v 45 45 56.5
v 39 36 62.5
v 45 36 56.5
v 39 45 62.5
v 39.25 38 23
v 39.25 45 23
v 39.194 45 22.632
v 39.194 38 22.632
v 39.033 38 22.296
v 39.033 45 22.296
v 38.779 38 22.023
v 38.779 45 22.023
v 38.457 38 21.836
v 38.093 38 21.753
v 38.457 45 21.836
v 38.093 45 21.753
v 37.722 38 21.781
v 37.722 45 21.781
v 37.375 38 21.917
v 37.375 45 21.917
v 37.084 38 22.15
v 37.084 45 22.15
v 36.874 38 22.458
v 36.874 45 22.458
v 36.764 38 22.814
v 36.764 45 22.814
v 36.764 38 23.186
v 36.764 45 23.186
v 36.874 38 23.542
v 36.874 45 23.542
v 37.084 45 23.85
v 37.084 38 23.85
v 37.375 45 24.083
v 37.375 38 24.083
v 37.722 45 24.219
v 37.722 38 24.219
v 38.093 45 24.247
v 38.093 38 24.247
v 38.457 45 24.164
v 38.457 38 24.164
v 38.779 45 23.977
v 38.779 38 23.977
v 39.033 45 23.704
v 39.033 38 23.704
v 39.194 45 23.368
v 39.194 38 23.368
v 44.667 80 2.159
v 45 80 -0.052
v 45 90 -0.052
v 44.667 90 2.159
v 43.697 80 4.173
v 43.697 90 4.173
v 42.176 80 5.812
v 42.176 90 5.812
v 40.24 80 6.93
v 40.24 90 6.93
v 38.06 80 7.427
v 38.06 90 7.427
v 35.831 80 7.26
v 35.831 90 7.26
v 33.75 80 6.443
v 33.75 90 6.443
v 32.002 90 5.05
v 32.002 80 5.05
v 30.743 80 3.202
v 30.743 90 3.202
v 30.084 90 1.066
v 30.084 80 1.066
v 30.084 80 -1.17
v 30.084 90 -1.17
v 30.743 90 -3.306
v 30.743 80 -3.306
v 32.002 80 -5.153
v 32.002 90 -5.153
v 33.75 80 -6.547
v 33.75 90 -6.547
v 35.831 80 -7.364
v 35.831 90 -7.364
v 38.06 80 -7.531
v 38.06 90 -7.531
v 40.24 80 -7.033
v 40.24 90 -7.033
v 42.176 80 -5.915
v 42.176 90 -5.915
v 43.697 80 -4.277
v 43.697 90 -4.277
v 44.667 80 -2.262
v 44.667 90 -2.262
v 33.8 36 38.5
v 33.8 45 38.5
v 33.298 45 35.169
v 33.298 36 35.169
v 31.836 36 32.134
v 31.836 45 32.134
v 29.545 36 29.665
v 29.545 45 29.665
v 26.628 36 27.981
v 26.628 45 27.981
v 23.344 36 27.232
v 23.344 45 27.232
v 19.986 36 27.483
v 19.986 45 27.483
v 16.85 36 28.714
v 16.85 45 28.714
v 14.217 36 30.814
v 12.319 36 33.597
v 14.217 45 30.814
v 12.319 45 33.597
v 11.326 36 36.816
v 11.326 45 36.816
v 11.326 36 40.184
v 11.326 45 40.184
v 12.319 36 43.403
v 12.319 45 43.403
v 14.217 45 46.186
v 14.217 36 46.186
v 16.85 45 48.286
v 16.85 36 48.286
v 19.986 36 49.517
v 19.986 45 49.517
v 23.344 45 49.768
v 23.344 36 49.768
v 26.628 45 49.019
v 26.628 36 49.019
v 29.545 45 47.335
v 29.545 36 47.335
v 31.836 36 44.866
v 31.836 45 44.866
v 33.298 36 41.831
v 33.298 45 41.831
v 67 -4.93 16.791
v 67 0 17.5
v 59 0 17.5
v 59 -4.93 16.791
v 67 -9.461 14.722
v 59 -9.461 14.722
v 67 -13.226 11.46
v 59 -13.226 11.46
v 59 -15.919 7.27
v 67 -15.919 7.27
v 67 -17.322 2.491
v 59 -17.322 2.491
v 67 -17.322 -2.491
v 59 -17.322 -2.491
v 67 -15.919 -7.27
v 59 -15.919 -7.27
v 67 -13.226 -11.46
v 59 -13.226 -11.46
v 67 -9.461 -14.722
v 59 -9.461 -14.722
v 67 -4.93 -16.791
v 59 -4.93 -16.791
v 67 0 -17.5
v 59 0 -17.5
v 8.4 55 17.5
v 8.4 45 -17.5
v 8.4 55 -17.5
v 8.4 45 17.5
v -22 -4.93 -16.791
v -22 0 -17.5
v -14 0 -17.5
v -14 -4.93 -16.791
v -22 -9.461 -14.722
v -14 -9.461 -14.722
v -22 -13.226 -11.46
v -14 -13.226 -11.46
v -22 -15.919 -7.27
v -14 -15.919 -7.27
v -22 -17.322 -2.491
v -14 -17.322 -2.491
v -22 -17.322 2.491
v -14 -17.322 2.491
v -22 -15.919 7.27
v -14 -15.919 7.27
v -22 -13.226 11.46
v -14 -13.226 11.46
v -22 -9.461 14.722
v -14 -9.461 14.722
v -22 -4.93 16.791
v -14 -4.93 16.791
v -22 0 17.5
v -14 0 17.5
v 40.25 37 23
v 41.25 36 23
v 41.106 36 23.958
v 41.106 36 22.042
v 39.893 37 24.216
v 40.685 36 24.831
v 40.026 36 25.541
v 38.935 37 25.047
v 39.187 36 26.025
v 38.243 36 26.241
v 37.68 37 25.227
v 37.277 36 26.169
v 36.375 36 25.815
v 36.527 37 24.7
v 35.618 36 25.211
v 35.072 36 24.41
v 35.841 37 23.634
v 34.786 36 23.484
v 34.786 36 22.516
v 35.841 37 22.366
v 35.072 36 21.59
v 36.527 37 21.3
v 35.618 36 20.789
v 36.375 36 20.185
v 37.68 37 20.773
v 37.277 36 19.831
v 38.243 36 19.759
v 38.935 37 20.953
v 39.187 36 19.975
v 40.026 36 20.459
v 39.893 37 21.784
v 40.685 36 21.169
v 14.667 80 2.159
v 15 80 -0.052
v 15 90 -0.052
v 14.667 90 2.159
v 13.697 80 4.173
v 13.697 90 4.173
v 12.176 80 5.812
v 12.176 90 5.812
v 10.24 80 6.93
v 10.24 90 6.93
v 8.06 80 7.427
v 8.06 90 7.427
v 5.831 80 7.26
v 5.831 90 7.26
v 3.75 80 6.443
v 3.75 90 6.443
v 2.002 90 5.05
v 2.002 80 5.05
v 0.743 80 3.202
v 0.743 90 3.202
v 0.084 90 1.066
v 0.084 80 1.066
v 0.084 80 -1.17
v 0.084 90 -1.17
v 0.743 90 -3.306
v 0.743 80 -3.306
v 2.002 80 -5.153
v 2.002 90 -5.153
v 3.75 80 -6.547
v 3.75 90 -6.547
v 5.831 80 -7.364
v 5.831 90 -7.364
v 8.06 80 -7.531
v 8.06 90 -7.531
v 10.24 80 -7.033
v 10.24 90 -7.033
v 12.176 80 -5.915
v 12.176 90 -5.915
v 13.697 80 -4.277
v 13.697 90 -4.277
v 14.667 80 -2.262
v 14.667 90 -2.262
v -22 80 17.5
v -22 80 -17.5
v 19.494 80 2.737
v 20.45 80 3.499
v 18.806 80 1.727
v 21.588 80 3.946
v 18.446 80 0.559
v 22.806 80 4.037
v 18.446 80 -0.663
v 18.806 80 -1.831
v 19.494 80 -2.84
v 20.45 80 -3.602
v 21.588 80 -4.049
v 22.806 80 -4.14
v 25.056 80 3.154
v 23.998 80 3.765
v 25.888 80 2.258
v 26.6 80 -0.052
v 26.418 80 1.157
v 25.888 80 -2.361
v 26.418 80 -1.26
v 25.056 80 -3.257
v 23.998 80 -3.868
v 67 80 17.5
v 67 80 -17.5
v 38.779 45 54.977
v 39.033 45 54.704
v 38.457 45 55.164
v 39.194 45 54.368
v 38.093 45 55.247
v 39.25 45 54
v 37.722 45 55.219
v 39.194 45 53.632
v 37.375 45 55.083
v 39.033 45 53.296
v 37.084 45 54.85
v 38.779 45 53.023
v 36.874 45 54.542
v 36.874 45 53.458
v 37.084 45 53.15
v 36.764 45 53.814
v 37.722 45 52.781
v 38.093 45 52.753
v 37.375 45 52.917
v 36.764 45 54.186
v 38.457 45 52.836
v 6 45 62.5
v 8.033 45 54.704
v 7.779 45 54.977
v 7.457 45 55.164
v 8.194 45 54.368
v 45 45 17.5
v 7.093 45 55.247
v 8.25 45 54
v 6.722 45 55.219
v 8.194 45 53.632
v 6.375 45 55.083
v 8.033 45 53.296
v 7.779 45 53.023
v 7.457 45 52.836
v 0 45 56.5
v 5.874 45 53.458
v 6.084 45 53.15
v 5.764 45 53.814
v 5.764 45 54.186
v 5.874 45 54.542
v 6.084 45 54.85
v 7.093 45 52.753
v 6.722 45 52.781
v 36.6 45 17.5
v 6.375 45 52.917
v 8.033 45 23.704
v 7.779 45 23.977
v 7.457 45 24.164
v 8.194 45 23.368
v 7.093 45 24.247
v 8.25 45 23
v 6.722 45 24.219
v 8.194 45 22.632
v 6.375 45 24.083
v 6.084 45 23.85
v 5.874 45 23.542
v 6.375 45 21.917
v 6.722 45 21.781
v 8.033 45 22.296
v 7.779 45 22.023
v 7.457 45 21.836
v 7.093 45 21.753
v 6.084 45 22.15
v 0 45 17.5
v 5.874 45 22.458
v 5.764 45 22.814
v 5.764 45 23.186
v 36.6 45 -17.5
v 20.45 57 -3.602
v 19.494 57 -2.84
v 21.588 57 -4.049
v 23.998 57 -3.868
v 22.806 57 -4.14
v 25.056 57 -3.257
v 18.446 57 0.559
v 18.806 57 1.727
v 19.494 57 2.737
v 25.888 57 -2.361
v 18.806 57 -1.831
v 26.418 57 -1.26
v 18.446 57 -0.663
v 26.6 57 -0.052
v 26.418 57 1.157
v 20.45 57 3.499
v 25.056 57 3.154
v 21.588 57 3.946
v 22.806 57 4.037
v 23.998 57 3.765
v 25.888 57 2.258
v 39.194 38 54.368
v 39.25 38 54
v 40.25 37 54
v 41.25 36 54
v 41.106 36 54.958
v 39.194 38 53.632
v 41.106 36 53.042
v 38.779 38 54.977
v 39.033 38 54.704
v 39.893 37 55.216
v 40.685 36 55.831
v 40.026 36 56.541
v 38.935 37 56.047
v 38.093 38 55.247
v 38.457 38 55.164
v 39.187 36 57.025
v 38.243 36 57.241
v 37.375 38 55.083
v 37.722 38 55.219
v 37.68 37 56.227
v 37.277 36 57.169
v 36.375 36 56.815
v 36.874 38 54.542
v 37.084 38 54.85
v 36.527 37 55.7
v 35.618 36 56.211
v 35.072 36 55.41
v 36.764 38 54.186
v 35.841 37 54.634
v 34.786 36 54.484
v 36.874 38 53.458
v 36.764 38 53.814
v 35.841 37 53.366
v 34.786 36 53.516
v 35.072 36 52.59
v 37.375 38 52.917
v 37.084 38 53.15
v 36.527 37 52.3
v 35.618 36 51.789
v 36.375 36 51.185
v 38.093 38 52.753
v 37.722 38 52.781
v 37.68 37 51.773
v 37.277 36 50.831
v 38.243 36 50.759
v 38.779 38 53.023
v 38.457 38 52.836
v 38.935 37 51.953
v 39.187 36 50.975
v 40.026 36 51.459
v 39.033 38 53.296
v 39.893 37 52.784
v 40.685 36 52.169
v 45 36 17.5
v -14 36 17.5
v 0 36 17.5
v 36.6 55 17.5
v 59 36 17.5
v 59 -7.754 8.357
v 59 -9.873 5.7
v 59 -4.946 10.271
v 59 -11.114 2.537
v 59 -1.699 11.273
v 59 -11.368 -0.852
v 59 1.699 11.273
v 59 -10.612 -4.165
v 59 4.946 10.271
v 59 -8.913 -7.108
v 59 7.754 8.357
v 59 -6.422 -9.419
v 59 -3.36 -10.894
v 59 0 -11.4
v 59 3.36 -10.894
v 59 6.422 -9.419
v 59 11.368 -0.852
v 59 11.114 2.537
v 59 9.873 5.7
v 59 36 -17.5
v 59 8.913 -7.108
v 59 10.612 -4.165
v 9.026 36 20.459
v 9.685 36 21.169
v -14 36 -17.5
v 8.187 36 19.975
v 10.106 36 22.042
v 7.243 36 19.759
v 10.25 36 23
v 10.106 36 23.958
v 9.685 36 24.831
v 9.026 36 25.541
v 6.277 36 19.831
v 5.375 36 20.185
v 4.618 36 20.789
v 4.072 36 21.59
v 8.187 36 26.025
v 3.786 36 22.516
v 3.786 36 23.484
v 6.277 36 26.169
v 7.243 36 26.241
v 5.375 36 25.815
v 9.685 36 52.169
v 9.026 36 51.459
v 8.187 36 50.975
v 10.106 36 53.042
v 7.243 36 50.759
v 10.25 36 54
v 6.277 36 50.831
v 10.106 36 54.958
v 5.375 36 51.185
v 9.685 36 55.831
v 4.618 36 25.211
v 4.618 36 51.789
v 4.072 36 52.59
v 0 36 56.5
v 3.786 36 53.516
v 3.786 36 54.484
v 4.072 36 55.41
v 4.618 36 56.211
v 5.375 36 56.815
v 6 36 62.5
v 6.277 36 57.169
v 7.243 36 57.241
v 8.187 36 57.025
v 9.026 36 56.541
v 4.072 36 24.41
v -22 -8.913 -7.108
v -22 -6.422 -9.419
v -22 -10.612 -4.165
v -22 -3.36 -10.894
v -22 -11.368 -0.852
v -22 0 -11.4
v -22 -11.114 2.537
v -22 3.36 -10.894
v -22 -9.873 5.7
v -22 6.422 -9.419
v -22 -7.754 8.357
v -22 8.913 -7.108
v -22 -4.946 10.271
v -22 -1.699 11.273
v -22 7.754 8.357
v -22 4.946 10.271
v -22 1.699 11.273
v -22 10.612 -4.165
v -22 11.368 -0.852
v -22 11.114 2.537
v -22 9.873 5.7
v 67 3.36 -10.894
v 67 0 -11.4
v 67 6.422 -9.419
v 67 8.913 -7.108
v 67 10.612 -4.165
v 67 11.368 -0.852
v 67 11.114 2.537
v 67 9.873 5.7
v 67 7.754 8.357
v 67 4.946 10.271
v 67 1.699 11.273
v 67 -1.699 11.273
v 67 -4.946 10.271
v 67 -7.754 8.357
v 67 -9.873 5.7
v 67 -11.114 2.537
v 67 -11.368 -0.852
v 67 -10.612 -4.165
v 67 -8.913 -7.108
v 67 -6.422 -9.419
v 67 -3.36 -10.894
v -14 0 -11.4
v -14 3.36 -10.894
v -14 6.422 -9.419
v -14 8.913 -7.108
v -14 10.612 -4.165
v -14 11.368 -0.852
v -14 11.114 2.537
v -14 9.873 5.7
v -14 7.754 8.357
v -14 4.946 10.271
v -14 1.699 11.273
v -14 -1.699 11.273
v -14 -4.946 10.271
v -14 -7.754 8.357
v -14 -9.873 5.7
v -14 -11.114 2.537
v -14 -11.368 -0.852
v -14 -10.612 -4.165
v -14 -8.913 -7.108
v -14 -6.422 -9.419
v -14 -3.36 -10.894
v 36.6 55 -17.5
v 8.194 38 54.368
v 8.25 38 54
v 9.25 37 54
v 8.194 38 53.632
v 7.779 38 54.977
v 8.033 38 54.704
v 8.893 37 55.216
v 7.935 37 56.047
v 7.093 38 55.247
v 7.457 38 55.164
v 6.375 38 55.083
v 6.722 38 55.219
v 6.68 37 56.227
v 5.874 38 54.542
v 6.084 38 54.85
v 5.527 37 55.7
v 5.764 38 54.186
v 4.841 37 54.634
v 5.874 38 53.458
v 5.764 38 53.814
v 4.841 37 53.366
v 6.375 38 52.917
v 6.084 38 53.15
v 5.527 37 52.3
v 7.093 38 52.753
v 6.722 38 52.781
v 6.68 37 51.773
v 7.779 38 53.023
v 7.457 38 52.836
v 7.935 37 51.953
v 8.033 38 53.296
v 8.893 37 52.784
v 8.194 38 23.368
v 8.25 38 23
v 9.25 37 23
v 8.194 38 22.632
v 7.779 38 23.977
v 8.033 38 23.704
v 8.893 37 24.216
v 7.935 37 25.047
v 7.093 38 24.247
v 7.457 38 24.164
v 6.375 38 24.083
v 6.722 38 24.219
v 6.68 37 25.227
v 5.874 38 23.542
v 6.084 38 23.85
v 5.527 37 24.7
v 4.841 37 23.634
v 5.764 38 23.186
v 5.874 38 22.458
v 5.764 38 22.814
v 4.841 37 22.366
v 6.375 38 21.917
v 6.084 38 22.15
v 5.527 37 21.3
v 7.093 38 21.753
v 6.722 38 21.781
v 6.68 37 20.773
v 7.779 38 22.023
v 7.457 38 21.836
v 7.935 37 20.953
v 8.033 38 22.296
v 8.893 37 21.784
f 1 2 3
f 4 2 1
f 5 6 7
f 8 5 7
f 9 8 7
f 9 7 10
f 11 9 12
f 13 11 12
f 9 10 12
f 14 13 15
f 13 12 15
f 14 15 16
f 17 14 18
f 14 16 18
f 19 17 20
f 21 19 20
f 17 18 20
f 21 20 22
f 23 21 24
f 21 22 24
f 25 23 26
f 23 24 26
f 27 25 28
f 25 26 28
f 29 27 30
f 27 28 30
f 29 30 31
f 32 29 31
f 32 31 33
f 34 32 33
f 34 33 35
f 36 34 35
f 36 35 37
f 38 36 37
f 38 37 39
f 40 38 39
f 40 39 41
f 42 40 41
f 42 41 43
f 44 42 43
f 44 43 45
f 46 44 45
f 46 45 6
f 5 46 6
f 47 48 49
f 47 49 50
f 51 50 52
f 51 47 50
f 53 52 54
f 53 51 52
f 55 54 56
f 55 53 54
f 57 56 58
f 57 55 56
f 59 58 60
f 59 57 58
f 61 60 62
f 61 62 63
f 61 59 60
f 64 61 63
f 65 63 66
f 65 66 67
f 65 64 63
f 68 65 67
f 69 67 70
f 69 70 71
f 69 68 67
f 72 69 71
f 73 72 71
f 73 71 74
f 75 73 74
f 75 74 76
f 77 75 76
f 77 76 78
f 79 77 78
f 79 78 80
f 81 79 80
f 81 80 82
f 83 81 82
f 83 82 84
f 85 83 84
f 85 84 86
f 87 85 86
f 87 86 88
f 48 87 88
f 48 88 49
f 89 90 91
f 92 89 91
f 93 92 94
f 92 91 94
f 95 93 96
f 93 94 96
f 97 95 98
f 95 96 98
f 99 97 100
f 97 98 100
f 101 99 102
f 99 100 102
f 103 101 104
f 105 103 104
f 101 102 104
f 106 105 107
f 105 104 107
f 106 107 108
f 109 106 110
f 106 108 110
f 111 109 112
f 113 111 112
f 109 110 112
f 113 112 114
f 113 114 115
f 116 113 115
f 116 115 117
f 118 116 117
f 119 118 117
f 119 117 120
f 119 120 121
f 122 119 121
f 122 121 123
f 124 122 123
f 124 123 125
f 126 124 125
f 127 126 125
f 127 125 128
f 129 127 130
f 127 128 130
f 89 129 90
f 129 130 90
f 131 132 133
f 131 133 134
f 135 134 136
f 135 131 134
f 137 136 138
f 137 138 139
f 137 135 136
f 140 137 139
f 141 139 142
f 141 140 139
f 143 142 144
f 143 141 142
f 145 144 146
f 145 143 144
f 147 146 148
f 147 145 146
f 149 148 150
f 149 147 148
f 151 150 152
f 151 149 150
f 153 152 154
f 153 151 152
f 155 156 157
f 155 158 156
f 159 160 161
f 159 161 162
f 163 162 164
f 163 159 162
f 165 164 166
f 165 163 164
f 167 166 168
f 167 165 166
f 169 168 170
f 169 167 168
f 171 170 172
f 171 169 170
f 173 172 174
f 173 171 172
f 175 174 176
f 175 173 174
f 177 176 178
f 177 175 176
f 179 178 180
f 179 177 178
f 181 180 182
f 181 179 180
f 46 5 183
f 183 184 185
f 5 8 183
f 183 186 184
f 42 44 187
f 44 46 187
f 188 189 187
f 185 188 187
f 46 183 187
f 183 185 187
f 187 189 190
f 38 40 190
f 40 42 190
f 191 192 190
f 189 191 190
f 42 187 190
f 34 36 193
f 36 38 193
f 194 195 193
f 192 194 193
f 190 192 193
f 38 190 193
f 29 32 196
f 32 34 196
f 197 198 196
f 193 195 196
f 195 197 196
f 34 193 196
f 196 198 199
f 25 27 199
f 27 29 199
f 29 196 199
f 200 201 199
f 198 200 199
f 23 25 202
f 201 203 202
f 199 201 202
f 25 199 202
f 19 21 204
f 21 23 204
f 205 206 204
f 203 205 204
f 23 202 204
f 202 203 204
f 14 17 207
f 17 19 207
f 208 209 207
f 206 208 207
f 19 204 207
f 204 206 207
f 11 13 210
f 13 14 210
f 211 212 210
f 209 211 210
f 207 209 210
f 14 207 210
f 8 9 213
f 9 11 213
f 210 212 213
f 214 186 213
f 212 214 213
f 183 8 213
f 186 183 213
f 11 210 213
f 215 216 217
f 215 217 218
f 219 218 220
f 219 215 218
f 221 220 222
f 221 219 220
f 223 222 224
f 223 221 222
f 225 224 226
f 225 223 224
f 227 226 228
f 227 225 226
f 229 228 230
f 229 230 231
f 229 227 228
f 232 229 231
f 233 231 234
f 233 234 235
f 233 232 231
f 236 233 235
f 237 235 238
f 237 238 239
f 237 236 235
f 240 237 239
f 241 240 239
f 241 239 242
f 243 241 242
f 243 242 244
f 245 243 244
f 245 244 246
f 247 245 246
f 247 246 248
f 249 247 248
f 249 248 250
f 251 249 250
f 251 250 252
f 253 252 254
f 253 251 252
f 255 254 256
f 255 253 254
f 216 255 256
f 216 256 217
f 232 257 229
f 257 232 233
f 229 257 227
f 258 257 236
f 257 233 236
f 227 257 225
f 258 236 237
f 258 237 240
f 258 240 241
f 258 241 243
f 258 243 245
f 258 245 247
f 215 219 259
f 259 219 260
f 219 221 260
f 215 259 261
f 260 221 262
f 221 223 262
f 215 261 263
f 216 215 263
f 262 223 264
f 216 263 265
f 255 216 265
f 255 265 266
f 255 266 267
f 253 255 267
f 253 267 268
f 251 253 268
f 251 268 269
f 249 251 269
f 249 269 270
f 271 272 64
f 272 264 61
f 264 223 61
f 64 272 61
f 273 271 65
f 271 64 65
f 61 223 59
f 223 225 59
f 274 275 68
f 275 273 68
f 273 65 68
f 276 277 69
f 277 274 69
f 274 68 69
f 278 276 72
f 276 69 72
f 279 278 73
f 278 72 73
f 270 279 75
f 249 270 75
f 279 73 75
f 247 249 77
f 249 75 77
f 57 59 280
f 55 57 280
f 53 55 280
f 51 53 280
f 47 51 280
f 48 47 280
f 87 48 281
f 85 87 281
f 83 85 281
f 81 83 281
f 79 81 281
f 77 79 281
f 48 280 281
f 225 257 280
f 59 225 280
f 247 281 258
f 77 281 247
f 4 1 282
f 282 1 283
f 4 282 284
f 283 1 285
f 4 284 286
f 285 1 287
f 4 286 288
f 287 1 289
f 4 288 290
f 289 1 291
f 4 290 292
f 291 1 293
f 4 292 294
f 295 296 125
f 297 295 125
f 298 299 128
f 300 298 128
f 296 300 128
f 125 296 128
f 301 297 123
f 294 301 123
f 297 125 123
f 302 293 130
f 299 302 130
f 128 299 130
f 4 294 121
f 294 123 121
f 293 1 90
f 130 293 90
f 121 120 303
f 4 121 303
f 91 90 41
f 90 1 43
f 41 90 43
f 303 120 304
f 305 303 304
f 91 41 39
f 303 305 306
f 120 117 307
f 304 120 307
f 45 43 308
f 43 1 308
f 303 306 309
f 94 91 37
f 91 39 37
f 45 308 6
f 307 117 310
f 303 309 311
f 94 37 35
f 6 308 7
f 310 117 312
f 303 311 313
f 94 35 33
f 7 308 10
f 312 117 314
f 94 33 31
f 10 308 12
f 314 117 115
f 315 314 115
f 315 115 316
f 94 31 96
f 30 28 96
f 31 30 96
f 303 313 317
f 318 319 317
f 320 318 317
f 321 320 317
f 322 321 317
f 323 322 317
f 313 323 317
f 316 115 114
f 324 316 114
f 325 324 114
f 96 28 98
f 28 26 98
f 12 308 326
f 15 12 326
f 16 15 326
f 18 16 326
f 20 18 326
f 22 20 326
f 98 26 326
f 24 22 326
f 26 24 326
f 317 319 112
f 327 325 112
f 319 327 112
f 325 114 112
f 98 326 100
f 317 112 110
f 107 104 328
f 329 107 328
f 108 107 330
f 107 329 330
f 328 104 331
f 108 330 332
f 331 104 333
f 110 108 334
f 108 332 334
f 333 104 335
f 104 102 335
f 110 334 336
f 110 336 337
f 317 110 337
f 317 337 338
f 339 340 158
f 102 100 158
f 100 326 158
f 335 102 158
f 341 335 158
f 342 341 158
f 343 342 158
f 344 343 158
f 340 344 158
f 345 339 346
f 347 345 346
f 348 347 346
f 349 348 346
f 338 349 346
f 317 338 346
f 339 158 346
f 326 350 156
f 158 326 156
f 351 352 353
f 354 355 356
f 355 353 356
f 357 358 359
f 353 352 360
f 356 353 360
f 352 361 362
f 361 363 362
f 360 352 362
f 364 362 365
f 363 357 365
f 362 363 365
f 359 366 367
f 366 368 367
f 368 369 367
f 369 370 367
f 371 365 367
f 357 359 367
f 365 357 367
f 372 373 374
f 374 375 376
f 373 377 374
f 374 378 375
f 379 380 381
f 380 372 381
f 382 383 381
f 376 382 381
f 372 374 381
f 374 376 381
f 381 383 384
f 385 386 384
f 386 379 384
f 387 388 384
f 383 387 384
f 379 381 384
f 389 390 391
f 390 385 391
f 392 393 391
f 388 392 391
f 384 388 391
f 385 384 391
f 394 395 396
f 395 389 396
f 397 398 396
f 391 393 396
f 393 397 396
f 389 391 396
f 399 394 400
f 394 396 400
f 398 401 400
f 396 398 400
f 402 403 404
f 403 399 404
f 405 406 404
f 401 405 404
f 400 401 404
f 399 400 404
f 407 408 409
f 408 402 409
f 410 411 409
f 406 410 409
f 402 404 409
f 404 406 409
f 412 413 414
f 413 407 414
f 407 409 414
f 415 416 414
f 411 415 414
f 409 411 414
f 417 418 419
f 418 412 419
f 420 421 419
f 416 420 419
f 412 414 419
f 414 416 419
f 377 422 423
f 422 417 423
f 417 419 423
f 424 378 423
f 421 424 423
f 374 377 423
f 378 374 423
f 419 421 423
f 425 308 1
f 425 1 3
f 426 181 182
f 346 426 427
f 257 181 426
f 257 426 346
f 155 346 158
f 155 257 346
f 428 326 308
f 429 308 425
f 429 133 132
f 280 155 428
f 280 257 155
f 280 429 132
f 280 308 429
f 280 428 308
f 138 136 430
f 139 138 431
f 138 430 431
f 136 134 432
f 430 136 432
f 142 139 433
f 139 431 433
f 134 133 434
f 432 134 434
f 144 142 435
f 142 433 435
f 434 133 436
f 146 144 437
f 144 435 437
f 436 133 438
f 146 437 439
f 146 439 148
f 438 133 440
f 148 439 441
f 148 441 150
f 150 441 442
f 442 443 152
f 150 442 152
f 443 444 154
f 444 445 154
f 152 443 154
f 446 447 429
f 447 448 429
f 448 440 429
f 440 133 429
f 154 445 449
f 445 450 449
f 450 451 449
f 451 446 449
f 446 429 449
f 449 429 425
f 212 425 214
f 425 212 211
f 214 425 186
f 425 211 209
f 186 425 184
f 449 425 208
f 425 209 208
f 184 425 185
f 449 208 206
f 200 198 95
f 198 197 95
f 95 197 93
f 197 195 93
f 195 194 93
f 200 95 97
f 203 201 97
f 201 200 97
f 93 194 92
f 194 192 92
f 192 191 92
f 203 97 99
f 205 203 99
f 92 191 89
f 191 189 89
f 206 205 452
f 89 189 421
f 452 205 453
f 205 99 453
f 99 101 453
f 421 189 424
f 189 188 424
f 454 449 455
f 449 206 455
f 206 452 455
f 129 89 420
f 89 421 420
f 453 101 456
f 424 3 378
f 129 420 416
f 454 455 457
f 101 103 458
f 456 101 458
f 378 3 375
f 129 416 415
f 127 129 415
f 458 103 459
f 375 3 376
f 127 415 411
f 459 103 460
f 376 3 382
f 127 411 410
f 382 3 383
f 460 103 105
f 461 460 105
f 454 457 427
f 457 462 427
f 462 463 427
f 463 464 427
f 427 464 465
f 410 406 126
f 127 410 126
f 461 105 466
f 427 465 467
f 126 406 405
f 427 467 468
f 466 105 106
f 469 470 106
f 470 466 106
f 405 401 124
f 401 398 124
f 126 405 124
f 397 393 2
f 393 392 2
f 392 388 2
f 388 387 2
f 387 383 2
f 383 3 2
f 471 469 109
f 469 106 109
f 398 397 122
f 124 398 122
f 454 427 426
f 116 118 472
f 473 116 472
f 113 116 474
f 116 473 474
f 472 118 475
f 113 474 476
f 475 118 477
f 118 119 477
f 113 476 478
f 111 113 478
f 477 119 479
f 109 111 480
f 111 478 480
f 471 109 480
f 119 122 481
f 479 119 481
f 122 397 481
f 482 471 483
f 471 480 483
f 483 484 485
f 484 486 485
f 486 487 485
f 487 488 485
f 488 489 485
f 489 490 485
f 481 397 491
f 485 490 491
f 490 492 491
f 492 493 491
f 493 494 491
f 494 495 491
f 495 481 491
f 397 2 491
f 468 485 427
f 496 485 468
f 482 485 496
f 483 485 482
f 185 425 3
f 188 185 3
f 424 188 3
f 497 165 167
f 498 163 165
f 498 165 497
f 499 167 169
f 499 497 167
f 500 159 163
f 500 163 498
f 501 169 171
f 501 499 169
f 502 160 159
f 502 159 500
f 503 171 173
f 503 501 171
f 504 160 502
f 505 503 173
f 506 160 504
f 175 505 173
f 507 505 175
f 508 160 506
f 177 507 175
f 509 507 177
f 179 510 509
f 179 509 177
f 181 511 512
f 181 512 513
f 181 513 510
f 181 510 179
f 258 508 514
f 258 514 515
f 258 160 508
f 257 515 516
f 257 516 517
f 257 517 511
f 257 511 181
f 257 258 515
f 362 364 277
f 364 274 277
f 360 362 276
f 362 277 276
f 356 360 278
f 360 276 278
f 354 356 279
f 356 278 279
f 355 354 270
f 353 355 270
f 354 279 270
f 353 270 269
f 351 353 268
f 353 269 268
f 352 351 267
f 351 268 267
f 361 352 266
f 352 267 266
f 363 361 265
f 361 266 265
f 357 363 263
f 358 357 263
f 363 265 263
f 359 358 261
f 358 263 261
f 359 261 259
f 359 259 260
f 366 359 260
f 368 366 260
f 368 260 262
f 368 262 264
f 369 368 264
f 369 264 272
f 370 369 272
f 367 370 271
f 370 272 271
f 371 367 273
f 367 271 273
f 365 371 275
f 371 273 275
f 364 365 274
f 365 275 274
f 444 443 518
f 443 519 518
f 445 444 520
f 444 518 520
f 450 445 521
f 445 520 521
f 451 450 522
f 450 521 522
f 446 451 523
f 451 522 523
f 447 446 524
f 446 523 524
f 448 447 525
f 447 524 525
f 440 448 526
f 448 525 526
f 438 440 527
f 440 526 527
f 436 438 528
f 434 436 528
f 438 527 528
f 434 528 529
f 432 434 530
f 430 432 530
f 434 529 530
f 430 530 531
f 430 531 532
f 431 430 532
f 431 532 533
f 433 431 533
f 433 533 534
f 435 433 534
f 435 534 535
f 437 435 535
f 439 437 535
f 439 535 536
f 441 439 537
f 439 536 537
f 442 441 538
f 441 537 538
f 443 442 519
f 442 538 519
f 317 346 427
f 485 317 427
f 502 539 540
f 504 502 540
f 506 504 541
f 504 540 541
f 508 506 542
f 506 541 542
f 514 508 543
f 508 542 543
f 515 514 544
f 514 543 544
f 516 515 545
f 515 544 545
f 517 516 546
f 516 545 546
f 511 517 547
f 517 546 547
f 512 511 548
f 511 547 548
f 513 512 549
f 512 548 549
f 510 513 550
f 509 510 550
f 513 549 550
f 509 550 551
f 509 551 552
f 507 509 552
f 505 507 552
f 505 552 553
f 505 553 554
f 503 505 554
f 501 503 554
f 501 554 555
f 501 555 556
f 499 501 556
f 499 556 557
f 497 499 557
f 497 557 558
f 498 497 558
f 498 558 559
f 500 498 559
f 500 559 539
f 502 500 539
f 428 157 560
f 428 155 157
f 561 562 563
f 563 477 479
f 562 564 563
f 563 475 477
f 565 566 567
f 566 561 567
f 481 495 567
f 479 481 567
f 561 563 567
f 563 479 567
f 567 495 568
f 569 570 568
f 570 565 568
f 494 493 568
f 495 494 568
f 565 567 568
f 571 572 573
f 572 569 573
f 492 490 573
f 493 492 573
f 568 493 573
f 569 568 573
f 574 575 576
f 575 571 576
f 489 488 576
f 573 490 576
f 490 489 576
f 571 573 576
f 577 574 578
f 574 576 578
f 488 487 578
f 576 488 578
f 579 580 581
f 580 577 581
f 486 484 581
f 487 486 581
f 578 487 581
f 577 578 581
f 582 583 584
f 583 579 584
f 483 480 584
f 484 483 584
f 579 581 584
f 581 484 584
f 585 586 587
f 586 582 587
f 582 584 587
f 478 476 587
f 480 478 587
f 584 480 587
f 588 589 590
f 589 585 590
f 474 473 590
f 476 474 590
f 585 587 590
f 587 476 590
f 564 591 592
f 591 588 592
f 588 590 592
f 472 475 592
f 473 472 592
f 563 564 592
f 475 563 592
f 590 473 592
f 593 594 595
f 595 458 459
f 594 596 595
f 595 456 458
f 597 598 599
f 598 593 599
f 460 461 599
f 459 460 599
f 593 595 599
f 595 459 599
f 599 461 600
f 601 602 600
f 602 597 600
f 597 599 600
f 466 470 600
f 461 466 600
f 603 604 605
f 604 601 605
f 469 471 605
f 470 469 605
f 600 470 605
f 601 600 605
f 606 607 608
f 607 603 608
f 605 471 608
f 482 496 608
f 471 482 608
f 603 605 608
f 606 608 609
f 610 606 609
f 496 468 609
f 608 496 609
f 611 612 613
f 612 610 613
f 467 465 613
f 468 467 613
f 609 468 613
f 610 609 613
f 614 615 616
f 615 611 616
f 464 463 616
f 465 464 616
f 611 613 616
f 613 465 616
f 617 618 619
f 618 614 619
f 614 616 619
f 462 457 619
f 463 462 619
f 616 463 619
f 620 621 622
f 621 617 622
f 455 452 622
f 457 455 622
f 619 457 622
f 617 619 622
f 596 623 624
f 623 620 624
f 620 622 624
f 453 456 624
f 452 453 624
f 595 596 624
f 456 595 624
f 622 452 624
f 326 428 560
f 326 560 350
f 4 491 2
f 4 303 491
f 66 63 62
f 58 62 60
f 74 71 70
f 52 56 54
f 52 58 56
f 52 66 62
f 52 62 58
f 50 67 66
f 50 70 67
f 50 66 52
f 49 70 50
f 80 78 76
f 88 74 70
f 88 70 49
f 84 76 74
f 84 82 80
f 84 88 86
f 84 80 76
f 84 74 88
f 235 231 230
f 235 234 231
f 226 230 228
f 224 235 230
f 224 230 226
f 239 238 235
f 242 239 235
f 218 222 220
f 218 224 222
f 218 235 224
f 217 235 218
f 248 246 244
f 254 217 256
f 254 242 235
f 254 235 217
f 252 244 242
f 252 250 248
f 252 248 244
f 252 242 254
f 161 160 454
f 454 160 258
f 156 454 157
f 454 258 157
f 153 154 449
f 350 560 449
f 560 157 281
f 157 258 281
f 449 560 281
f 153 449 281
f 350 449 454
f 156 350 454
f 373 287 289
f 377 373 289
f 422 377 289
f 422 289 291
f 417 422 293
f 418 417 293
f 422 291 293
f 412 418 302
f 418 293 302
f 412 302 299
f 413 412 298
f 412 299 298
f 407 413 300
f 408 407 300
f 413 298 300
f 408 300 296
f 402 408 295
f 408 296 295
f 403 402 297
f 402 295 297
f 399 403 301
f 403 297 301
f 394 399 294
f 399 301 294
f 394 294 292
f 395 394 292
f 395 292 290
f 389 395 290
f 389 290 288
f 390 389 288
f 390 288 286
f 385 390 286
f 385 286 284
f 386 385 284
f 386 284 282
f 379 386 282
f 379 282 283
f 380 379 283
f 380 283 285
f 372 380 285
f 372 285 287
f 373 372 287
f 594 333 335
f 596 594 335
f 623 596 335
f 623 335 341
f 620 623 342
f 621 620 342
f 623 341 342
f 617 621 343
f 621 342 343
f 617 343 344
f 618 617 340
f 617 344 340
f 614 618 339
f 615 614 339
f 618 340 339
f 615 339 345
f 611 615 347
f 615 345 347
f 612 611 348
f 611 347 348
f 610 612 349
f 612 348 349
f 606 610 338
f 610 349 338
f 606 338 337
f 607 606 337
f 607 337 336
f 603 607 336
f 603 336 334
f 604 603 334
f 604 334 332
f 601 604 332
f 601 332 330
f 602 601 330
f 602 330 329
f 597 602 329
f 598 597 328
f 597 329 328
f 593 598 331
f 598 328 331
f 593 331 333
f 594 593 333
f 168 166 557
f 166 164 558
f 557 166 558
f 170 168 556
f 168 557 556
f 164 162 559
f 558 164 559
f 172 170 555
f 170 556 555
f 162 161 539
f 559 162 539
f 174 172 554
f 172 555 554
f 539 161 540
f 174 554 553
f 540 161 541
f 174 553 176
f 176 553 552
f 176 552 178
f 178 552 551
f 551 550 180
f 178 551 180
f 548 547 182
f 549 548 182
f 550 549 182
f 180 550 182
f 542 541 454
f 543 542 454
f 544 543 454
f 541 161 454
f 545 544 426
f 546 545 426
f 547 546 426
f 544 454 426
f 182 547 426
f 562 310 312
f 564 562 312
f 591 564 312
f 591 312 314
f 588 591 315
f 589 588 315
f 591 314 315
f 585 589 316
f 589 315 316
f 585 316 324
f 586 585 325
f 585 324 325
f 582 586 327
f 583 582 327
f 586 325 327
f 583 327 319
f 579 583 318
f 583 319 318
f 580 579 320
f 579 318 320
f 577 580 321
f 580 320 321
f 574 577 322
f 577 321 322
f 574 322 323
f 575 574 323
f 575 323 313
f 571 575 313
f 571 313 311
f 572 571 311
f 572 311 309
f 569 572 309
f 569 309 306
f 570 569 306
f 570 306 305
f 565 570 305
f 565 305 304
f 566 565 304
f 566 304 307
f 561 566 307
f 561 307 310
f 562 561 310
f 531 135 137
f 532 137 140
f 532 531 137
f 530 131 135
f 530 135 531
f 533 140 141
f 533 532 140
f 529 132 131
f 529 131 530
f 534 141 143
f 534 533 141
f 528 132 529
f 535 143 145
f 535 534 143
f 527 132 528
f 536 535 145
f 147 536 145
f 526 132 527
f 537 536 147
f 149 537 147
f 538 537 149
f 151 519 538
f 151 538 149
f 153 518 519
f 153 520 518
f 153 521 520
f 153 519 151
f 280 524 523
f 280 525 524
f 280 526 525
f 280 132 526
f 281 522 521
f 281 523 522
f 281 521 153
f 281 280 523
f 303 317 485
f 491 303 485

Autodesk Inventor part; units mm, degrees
ref_plane "YZ Plane" through (0, 0, 0) normal (1, 0, 0) x (0, 1, 0)
ref_plane "XZ Plane" through (0, 0, 0) normal (0, 1, 0) x (-1, 0, 0)
sketch "Эскиз1" plane through (0, 0, 0) normal (1, 0, 0) x (0, 1, 0)
  line L0 (-6, -6.0208) -> (-6, 6.0208)
  arc A0 (-6, -6.0208) -> (6, -6.0208) centre (0, 0) ccw
  line L1 (6, 6.0208) -> (6, -6.0208)
  arc A1 (6, 6.0208) -> (-6, 6.0208) centre (0, 0) ccw
  circle A2 centre (0, 0) radius 17.5
  line L2 (0, 17.5) -> (80, 17.5)
  line L3 (80, 17.5) -> (80, -17.5)
  line L4 (80, -17.5) -> (0, -17.5)
  line L5 (0, -17.5) -> (0, -8.5)
  line L6 (0, 8.5) -> (0, 17.5)
  dimension "d0" = 35
  dimension "d1" = 80
extrude "Выдавливание1" add sketch "Эскиз1" along normal blind 45 contours A0 L5 A2 L6 A1 L0 | A0 L1 A1 L6 A2 L5 | A2 L2 L3 L4
sketch "Эскиз2" plane through (45, 0, 0) normal (1, 0, 0) x (0, 0, -1)
  line L0 (17.5, 80) -> (-17.5, 80) projected
  line L1 (17.5, 0) -> (17.5, 80) projected
  line L2 (-17.5, 80) -> (17.5, 80)
  line L3 (17.5, 80) -> (17.5, 57)
  line L4 (17.5, 57) -> (-17.5, 57)
  line L5 (-17.5, 57) -> (-17.5, 80)
  point P0 (0, 0)
  dimension "d4" = 23
extrude "Выдавливание2" add sketch "Эскиз2" along normal blind 22
ref_plane "РабПлоскость1" through (22.5, 0, 17.5) normal (1, 0, 0) x (0, 0, -1)
mirror "Зеркальное отражение1" about plane through (22.5, 0, 17.5) normal (1, 0, 0) of "Выдавливание2"
sketch "Эскиз3" plane through (45, 0, 0) normal (1, 0, 0) x (0, 0, -1)
  arc A0 (6.0208, -6) -> (6.0208, 6) centre (0, 0) ccw projected
  line L0 (6.0208, -6) -> (-6.0208, -6) projected
  arc A1 (-6.0208, 6) -> (-6.0208, -6) centre (0, 0) ccw projected
  line L1 (6.0208, 6) -> (-6.0208, 6) projected
  line L2 (17.5, 57) -> (-17.5, 57) projected
  line L3 (-17.5, 57) -> (-17.5, 0) projected
  arc A2 (-17.5, 0) -> (17.5, 0) centre (0, 0) ccw projected
  line L4 (17.5, 0) -> (17.5, 57) projected
sketch "Эскиз4" plane through (67, 0, 0) normal (1, 0, 0) x (0, 0, -1)
  arc A0 (6.0208, -6) -> (6.0208, 6) centre (0, 0) ccw
  line L0 (6.0208, -6) -> (-6.0208, -6)
  arc A1 (-6.0208, 6) -> (-6.0208, -6) centre (0, 0) ccw
  line L1 (6.0208, 6) -> (-6.0208, 6)
  line L2 (17.5, 37) -> (-17.5, 37)
  line L3 (-17.5, 37) -> (-17.5, 0)
  arc A2 (-17.5, 0) -> (17.5, 0) centre (0, 0) ccw
  line L4 (17.5, 0) -> (17.5, 37)
  line L5 (17.5, 0) -> (17.5, 57) projected
  line L6 (-17.5, 37) -> (17.5, 37)
  line L7 (17.5, 37) -> (17.5, 57)
  line L8 (17.5, 57) -> (-17.5, 57)
  line L9 (-17.5, 57) -> (-17.5, 37)
extrude "Выдавливание3" add sketch "Эскиз4" against normal blind 8
mirror "Зеркальное отражение2" about plane through (22.5, 0, 17.5) normal (1, 0, 0) of "Выдавливание3"
sketch "Эскиз5" plane through (67, 80, 17.5) normal (0, 1, 0) x (1, 0, 0)
  line L0 (-89, 35) -> (-89, 0) projected
  line L1 (-89, 35.1034) -> (-89, 0)
  line L2 (-89, 0) -> (-89, 35.1034)
  line L3 (-89, 35) -> (0, 35) projected
  line L4 (-89, 35) -> (0, 35)
  line L5 (-89, 17.5517) -> (-44.5, 17.5517)
  circle A0 centre (-44.5, 17.5517) radius 4.1
  line L6 (-44.5, 17.5517) -> (-59.5, 17.5517)
  circle A1 centre (-59.5, 17.5517) radius 7.5
  line L7 (-44.5, 17.5517) -> (-29.5, 17.5517)
  circle A2 centre (-29.5, 17.5517) radius 7.5
  point P0 (-67, 17.5)
  dimension "d9" = 8.2
  dimension "d10" = 15
  dimension "d11" = 15
  dimension "d12" = 15
  dimension "d13" = 15
extrude "Выдавливание4" add sketch "Эскиз5" along normal blind 10 contours L5 A1 | L5 A1 | A2
sketch "Эскиз6" plane through (67, 80, 17.5) normal (0, 1, 0) x (1, 0, 0)
  line L0 (-89, 35) -> (-89, 0)
  line L1 (-89, 35.1034) -> (-89, 0)
  line L2 (-89, 0) -> (-89, 35.1034)
  line L3 (-89, 35) -> (0, 35)
  line L4 (-89, 35) -> (0, 35)
  line L5 (-89, 17.5517) -> (-44.5, 17.5517)
  circle A0 centre (-44.5, 17.5517) radius 4.1
  line L6 (-44.5, 17.5517) -> (-59.5, 17.5517)
  circle A1 centre (-59.5, 17.5517) radius 7.5
  line L7 (-44.5, 17.5517) -> (-29.5, 17.5517)
  circle A2 centre (-29.5, 17.5517) radius 7.5
  point P0 (-67, 17.5)
  point P1 (-67, 17.5)
  dimension "d16" = 8.2
  dimension "d17" = 15
  dimension "d18" = 15
  dimension "d19" = 15
  dimension "d20" = 15
extrude "Выдавливание5" cut sketch "Эскиз6" against normal blind 35 contours A0 L7 L5 | L5 L7 A0
sketch "Эскиз7" plane through (0, 0, 17.5) normal (0, 0, 1) x (1, 0, 0)
  line L0 (18.4, 80) -> (18.4, 45) projected
  line L1 (26.6, 80) -> (26.6, 45) projected
  line L2 (0, 57) -> (0, 0) projected
  line L3 (45, 0) -> (0, 0) projected
  line L4 (45, 57) -> (45, 0) projected
  line L5 (45, 57) -> (59, 57) projected
  line L6 (67, 80) -> (67, 0) projected
  line L7 (-22, 80) -> (67, 80) projected
  line L8 (-22, 80) -> (-22, 0) projected
  line L9 (0, 57) -> (-14, 57) projected
  line L10 (18.4, 45) -> (26.6, 45) projected
  line L11 (18.4, 45) -> (8.4, 45)
  line L12 (8.4, 45) -> (8.4, 55)
  line L13 (8.4, 55) -> (36.6, 55)
  line L14 (36.6, 55) -> (36.6, 45)
  line L15 (26.6, 45) -> (36.6, 45)
  line L16 (18.4, 45) -> (26.6, 45)
  line L17 (59, 0) -> (59, 57) projected
  line L18 (67, 0) -> (59, 0) projected
  line L19 (-22, 0) -> (-14, 0) projected
  line L20 (-14, 0) -> (-14, 57) projected
  dimension "d23" = 10
  dimension "d24" = 10
  dimension "d25" = 28.2
  dimension "d26" = 10
extrude "Выдавливание6" cut sketch "Эскиз7" against normal blind 84.5 contours L13 L1 L10 L0 | L0 L11 L12 L13 | L13 L14 L15 L1
sketch "Эскиз8" plane through (0, 0, 17.5) normal (0, 0, 1) x (1, 0, 0)
  line L0 (8.4, 45) -> (36.6, 45) projected
  line L1 (8.4, 45) -> (0, 45)
  line L2 (0, 45) -> (0, 36)
  line L3 (0, 0) -> (0, 57) projected
  line L4 (45, -17.5) -> (45, 0) projected
  line L5 (0, 36) -> (45, 36)
  line L6 (45, 36) -> (45, -17.5)
  line L7 (45, -17.5) -> (0, -17.5)
  line L8 (0, -17.5) -> (0, 36)
  dimension "d29" = 9
extrude "Выдавливание7" cut sketch "Эскиз8" against normal blind 85.25
sketch "Эскиз9" plane through (67, 0, 0) normal (1, 0, 0) x (0, 0, -1)
  circle A0 centre (0, 0) radius 11.4
  dimension "d32" = 22.8
extrude "Выдавливание8" cut sketch "Эскиз9" against normal blind 144.5
sketch "Эскиз10" plane through (-22, 80, 17.5) normal (0, 0, 1) x (1, 0, 0)
  line L0 (22, -23) -> (22, -44) projected
  line L1 (67, -23) -> (67, -44) projected
  line L2 (22, -44) -> (67, -44)
  line L3 (67, -44) -> (67, -35)
  line L4 (67, -35) -> (22, -35)
  line L5 (22, -35) -> (22, -44)
  point P0 (22, -80)
  dimension "d35" = 9
extrude "Выдавливание9" add sketch "Эскиз10" along normal blind 45
sketch "Эскиз11" plane through (67, 45, 17.5) normal (0, 1, 0) x (1, 0, 0)
  line L0 (-67, 0) -> (-67, 35) projected
  line L1 (-67, 0) -> (-44.5, 0)
  line L2 (-67, 0) -> (-58.6, 0) projected
  line L3 (-22, -45) -> (-67, -45) projected
  line L4 (-44.5, -45) -> (-44.5, -21)
  line L5 (-27, -42) -> (-23.5, -38.5)
  line L6 (-23.5, -38.5) -> (-23.5, -3.5)
  line L7 (-23.5, -3.5) -> (-27, 0)
  line L8 (-27, 0) -> (-62, 0)
  line L9 (-62, 0) -> (-65.5, -3.5)
  line L10 (-65.5, -3.5) -> (-65.5, -38.5)
  line L11 (-65.5, -38.5) -> (-62, -42)
  line L12 (-62, -42) -> (-27, -42)
  circle A0 centre (-44.5, -21) radius 11.3
  circle A1 centre (-29, -5.5) radius 1.25
  circle A2 centre (-60, -5.5) radius 1.25
  circle A3 centre (-60, -36.5) radius 1.25
  circle A4 centre (-29, -36.5) radius 1.25
  line L13 (-52.5, -48) -> (-50.5, -48)
  line L14 (-50.5, -41.8) -> (-50.5, -48)
  line L15 (-57.9172, -41.8) -> (-50.5, -41.8)
  line L16 (-65.3, -34.4172) -> (-57.9172, -41.8)
  line L17 (-65.3, -7.5828) -> (-65.3, -34.4172)
  line L18 (-57.9172, -0.2) -> (-65.3, -7.5828)
  line L19 (-31.0828, -0.2) -> (-57.9172, -0.2)
  line L20 (-23.7, -7.5828) -> (-31.0828, -0.2)
  line L21 (-23.7, -34.4172) -> (-23.7, -7.5828)
  line L22 (-31.0828, -41.8) -> (-23.7, -34.4172)
  line L23 (-38.5, -41.8) -> (-31.0828, -41.8)
  line L24 (-38.5, -41.8) -> (-38.5, -48)
  line L25 (-38.5, -48) -> (-36.5, -48)
  line L26 (-36.5, -48) -> (-36.5, -42)
  line L27 (-36.5, -42) -> (-27, -42)
  line L28 (-27, -42) -> (-23.5, -38.5)
  line L29 (-23.5, -38.5) -> (-23.5, -3.5)
  line L30 (-23.5, -3.5) -> (-27, 0)
  line L31 (-27, 0) -> (-62, 0)
  line L32 (-62, 0) -> (-65.5, -3.5)
  line L33 (-65.5, -3.5) -> (-65.5, -38.5)
  line L34 (-65.5, -38.5) -> (-62, -42)
  line L35 (-62, -42) -> (-52.5, -42)
  line L36 (-52.5, -42) -> (-52.5, -48)
  point P0 (-67, 17.5)
  dimension "d38" = 22.5
  dimension "d39" = 24
extrude "Выдавливание10" cut sketch "Эскиз11" against normal blind 45 contours A0 | A1 | A2 | A3 | A4
chamfer "Фаска1" distance 2 angle 45 4 edges at (5.75, 36, 54) (5.75, 36, 23) (36.75, 36, 23) (36.75, 36, 54)
chamfer "Фаска2" distance 6 angle 45 2 edges at (0, 40.5, 62.5) (45, 40.5, 62.5)
sketch "Эскиз13" plane through (-22, 80, 17.5) normal (0, 0, 1) x (1, 0, 0)
  line L0 (81, -80) -> (81, -23) projected
  line L1 (22, -23) -> (8, -23) projected
  line L2 (81, -44) -> (8, -44)
  line L3 (8, -44) -> (8, -23)
  line L4 (8, -23) -> (81, -23)
  line L5 (81, -23) -> (81, -44)
  line L6 (61, -44) -> (67, -44) projected
  line L7 (22, -35) -> (30.4, -35) projected
  line L8 (30.4, -25) -> (58.6, -25) projected
  line L9 (30.4, -35) -> (58.6, -35)
  line L10 (58.6, -35) -> (58.6, -25)
  line L11 (58.6, -25) -> (30.4, -25)
  line L12 (30.4, -25) -> (30.4, -35)
  point P0 (22, -80)
  dimension "d51" = 0
extrude "Выдавливание12" add sketch "Эскиз13" against normal up to surface (35 mm away)
properties part number "joint1_level_part_2" material "Пластик АБС"
